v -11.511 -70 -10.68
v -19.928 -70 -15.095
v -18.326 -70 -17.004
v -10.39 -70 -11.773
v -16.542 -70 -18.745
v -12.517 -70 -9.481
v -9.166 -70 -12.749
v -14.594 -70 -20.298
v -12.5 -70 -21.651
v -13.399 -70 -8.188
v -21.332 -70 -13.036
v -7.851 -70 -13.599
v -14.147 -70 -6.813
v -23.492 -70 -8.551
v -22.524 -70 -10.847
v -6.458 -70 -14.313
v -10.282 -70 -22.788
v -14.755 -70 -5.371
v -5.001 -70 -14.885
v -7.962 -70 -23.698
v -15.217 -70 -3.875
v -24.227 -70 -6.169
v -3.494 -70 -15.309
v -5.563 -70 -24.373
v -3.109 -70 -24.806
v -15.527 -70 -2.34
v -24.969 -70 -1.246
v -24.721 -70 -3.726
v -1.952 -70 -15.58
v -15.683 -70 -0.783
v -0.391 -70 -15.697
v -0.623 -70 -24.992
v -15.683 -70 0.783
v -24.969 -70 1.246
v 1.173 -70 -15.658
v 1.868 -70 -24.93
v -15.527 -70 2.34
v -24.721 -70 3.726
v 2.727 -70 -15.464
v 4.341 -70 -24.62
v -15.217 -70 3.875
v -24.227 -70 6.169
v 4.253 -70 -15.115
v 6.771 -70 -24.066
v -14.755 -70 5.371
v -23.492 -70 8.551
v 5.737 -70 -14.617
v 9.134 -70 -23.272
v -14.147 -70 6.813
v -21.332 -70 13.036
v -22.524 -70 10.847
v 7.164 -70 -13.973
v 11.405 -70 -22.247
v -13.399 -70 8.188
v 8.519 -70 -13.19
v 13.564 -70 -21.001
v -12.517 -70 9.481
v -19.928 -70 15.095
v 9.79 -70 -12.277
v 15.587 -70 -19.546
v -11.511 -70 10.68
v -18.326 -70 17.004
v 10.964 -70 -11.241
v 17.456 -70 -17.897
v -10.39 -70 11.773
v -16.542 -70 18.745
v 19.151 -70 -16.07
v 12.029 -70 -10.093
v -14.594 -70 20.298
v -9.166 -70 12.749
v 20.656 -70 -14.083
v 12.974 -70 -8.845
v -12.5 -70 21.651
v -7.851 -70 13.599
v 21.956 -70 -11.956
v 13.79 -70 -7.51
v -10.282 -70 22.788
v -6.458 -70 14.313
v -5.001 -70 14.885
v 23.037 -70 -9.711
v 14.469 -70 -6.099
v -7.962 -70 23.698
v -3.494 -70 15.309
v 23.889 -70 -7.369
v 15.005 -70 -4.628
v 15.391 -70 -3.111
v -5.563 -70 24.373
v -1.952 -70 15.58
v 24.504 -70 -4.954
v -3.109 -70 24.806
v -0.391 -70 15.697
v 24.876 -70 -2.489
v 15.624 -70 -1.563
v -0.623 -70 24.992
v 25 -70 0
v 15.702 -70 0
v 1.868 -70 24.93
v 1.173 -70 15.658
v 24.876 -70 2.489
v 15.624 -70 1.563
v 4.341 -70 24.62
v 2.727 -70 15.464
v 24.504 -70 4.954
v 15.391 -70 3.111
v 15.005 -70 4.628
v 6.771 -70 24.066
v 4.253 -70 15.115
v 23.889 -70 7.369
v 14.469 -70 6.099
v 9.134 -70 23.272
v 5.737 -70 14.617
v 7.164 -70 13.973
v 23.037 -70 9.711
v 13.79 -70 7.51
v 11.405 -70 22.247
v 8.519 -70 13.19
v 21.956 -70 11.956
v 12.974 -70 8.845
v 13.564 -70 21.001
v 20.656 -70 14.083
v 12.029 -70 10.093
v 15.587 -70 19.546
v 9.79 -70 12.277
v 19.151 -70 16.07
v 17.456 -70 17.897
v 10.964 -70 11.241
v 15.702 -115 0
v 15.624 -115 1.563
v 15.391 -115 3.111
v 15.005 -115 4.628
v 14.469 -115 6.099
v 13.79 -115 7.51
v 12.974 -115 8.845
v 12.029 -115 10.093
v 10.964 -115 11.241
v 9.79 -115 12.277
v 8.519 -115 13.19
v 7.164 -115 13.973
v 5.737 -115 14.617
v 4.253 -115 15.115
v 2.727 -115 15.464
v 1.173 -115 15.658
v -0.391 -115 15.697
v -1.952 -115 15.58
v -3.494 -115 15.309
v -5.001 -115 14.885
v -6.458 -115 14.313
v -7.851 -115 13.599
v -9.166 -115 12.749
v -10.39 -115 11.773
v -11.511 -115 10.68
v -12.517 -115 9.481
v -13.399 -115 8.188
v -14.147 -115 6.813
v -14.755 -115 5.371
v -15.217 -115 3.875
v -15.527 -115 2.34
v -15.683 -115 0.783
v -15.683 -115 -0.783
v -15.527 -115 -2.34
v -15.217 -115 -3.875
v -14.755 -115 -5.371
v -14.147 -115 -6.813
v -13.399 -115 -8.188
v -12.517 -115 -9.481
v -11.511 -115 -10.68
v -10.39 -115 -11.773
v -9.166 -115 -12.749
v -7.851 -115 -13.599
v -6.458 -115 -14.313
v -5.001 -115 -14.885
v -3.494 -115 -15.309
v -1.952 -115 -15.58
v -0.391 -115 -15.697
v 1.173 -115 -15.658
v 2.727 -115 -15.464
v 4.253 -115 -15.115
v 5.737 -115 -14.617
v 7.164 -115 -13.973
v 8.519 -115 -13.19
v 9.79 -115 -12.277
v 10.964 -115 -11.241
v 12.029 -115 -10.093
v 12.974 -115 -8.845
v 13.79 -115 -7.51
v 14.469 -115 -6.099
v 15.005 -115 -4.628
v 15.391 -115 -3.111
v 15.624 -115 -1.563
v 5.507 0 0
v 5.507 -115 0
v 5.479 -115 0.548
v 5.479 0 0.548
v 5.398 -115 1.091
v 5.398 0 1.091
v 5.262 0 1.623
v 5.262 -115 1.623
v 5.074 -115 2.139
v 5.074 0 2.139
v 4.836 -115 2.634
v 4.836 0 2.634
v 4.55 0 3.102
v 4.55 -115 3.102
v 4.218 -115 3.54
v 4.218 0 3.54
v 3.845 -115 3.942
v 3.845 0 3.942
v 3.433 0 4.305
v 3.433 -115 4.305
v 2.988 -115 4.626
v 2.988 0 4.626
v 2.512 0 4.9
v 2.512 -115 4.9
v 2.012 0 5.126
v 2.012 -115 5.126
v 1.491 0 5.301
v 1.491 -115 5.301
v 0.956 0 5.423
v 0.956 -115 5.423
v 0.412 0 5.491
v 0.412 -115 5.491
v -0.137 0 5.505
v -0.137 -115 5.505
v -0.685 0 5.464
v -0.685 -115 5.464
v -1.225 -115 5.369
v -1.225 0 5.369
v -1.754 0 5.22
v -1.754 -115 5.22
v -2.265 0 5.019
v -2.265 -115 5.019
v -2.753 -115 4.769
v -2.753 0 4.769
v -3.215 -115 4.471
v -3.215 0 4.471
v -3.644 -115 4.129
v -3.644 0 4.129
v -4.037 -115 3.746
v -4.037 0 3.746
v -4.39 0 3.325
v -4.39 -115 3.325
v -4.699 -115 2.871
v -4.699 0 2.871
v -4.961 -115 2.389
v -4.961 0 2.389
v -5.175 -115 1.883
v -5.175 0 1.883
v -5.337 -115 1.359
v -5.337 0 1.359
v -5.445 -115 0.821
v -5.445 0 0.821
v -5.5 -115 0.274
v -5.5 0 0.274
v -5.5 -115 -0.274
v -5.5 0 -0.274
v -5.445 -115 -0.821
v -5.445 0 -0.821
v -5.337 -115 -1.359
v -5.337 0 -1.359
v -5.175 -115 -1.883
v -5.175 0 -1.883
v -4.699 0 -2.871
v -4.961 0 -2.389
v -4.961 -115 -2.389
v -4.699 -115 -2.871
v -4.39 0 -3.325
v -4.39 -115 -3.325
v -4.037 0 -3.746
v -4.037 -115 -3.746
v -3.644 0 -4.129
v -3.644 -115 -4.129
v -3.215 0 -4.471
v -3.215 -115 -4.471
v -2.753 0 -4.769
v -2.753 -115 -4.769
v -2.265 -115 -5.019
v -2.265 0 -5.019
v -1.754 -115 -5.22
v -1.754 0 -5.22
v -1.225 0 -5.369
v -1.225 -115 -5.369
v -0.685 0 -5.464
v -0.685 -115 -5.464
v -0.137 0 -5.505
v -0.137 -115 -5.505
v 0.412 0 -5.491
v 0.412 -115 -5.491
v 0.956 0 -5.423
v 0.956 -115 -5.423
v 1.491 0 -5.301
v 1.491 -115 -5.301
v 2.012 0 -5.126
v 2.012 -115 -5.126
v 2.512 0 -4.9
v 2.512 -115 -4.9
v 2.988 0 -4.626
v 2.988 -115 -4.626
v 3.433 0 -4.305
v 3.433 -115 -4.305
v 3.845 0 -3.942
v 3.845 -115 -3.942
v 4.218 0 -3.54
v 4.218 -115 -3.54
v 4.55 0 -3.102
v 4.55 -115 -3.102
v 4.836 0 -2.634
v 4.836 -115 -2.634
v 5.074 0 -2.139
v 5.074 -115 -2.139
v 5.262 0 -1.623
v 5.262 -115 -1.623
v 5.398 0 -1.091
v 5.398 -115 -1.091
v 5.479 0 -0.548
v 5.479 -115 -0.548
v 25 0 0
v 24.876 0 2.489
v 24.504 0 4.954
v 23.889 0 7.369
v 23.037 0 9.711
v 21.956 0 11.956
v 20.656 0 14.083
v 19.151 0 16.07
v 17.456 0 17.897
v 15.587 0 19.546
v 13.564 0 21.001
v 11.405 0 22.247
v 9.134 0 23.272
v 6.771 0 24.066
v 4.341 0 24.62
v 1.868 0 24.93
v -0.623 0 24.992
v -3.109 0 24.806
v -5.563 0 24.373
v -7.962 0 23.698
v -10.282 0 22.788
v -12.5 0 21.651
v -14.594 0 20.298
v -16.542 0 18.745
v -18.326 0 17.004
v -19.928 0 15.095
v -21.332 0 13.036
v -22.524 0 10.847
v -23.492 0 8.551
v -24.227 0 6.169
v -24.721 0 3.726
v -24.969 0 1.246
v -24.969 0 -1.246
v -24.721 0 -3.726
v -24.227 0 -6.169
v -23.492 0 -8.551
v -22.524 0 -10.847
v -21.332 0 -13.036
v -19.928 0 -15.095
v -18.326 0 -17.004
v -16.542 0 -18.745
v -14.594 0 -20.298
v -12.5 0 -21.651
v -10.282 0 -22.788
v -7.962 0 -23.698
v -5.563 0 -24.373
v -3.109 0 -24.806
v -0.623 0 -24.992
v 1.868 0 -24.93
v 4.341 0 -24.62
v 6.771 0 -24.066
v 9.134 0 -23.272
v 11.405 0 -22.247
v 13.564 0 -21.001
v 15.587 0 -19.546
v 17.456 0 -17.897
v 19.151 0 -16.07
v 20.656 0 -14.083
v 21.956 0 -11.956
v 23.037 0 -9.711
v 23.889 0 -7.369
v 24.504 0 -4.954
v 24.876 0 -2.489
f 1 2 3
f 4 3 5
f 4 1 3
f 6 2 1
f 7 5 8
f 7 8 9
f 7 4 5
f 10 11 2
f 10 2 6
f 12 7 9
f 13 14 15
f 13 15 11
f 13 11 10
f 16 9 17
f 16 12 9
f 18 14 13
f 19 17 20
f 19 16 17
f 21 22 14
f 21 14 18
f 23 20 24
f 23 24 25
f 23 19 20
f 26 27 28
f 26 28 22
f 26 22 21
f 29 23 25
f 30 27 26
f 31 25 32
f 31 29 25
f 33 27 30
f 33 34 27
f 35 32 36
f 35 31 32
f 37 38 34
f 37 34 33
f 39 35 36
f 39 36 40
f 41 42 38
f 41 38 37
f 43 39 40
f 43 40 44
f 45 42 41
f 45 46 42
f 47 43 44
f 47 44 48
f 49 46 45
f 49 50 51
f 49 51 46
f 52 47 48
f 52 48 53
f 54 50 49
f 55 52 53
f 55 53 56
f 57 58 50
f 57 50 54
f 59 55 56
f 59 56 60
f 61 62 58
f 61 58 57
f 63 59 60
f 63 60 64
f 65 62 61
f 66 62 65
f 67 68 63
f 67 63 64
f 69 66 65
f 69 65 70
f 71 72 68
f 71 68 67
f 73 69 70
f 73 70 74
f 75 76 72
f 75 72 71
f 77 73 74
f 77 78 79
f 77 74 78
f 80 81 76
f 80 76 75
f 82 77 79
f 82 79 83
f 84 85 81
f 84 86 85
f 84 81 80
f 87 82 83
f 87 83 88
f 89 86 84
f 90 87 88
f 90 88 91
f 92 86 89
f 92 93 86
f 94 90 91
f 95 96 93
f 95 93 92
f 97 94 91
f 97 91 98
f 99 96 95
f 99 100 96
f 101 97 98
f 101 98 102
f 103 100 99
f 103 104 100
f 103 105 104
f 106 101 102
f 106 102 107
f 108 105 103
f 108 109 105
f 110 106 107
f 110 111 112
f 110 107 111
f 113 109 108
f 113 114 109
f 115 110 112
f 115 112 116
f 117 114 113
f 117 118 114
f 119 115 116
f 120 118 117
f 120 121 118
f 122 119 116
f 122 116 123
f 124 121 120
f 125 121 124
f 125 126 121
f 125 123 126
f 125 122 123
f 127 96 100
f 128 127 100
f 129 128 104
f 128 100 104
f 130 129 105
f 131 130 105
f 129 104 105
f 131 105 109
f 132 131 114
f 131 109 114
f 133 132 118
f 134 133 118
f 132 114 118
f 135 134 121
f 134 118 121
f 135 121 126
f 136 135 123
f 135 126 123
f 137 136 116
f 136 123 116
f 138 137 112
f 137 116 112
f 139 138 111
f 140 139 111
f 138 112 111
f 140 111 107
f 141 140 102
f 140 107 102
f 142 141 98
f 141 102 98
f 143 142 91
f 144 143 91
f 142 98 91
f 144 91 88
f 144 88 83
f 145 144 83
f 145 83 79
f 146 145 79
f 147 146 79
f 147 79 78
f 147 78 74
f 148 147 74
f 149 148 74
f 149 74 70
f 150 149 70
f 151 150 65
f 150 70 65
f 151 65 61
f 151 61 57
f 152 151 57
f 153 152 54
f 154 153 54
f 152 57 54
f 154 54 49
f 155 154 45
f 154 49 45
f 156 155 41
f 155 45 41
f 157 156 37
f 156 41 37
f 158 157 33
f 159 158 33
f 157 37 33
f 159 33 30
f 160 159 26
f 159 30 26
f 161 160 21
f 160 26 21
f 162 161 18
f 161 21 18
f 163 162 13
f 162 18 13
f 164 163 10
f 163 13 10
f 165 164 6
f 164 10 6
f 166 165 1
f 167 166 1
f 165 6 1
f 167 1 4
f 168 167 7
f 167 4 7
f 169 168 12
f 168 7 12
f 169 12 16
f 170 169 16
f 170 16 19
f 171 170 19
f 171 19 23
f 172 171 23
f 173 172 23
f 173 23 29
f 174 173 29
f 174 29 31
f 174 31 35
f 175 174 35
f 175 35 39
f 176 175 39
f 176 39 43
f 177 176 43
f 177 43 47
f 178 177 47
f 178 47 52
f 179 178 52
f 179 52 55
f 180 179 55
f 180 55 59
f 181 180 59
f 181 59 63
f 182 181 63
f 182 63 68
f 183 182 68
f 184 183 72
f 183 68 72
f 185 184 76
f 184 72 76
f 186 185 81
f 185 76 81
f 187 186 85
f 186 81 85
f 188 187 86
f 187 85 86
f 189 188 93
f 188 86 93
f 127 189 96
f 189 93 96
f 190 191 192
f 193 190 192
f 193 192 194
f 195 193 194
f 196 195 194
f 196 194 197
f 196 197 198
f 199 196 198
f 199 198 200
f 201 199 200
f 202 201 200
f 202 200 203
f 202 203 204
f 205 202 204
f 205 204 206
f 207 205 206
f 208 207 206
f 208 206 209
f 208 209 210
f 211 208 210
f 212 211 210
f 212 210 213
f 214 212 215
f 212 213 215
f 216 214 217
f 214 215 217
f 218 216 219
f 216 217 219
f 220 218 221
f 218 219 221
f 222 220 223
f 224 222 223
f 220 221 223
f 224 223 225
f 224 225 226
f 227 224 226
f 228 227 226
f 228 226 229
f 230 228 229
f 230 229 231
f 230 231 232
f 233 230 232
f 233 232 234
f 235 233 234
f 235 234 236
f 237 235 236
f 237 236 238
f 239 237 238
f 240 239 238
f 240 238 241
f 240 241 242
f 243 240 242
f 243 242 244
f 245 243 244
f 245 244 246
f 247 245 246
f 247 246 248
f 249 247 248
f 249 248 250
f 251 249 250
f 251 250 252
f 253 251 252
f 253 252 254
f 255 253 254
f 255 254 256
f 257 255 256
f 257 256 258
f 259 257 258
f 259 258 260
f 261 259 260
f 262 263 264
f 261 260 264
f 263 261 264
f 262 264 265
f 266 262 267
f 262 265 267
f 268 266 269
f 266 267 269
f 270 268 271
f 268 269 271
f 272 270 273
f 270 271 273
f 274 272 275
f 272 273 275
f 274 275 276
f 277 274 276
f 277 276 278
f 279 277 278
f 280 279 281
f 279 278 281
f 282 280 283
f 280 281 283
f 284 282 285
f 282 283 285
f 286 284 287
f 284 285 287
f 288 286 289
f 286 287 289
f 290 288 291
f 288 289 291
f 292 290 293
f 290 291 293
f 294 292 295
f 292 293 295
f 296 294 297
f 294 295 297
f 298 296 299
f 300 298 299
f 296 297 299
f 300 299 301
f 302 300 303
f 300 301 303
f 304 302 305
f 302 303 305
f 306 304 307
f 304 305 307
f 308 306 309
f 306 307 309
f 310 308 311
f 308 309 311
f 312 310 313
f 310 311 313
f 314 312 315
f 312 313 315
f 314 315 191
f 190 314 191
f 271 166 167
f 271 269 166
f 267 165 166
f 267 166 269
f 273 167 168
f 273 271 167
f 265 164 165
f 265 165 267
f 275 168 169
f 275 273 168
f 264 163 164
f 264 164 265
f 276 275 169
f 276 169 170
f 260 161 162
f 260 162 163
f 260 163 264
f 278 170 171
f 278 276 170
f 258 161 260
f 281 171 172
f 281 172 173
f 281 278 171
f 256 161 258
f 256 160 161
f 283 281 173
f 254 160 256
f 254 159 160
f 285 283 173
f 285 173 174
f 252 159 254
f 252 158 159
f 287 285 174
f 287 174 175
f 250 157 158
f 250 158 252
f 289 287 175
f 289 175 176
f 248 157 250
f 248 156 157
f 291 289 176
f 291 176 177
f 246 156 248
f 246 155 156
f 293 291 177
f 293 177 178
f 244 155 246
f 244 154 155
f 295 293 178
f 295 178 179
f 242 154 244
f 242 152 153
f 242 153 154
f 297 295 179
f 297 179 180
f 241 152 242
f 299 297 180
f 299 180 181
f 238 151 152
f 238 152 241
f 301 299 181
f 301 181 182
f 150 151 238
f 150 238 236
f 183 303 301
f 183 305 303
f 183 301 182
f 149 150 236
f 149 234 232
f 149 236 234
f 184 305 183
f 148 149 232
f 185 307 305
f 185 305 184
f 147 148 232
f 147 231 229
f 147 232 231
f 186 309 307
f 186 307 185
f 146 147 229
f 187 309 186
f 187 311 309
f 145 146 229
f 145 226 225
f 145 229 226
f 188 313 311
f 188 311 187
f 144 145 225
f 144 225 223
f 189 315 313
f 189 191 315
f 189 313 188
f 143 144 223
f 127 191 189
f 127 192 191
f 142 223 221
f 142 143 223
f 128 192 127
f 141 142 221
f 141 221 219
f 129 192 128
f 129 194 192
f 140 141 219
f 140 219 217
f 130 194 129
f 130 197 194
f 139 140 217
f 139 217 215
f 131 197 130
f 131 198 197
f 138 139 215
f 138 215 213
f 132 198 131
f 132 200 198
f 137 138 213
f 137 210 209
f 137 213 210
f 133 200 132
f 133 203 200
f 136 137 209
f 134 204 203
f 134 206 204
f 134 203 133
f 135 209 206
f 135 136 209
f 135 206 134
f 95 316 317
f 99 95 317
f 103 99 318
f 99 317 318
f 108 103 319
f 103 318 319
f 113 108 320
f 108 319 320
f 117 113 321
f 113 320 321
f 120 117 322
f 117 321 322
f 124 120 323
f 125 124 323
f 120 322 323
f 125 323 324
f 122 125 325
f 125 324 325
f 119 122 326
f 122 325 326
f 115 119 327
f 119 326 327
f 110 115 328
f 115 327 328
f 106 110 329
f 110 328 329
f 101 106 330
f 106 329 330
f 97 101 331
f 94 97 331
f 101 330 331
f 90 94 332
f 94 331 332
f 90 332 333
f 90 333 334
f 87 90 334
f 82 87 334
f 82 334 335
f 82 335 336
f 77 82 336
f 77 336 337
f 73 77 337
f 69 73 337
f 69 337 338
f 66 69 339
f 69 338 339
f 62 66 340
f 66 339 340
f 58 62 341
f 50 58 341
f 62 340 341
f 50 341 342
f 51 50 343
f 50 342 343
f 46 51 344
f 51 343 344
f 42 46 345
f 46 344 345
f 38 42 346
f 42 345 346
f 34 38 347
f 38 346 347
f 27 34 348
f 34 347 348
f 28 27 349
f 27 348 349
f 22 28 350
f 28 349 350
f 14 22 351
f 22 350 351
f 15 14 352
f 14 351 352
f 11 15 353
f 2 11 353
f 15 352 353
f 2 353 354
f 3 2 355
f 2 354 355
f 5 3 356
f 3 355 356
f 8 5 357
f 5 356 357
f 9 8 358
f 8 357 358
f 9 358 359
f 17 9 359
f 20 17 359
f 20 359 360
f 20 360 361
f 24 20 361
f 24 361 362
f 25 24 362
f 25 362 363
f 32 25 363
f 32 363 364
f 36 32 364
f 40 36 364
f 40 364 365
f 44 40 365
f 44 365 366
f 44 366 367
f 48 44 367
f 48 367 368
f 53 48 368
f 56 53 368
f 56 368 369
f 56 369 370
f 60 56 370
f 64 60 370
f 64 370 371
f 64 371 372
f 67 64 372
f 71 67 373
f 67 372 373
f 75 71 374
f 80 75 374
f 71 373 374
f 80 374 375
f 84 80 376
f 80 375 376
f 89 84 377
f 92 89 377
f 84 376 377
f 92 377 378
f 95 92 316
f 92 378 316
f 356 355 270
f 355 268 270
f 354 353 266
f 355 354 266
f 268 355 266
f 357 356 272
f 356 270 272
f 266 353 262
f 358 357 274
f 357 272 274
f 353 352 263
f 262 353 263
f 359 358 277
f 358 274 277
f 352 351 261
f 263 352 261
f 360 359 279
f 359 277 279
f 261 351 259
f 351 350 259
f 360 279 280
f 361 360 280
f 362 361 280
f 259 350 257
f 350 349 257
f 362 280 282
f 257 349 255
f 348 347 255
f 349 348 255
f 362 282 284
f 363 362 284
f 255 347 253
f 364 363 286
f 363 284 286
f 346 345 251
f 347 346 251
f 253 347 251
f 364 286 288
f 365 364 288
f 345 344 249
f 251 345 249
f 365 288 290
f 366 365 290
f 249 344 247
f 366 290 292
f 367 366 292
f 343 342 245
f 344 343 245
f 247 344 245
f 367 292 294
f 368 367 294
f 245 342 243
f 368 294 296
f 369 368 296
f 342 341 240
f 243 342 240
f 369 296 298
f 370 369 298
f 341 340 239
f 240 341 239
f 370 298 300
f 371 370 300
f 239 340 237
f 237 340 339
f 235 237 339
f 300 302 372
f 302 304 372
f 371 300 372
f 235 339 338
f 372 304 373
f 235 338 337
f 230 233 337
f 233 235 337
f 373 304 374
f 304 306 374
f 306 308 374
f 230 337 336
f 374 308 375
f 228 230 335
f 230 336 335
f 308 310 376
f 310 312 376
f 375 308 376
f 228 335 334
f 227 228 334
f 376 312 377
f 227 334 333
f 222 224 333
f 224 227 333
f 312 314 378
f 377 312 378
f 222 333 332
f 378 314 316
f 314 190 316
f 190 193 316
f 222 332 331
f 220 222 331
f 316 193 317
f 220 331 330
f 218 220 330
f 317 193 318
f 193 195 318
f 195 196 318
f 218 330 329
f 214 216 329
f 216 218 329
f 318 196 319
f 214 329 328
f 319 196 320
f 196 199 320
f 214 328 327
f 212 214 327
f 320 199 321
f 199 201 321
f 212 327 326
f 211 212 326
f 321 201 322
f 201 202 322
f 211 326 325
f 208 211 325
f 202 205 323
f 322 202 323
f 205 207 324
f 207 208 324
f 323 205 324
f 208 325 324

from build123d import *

# Parameters (mm, degrees)
F0_R     = 25
F1_DEPTH = 70
F2_R     = 15.702302
F3_DEPTH = 45
F4_R     = 5.506821
F5_DEPTH = 115.001


with BuildPart() as f1:
    # F0 (on Front) → F1 (new body)
    with BuildSketch(Plane.XZ):
        Circle(F0_R)
    extrude(amount=F1_DEPTH)

    # F2 (on face) → F3 (join)
    with BuildSketch(Plane.XZ.offset(70)):
        Circle(F2_R)
    extrude(amount=F3_DEPTH)

    # F4 (on face) → F5 (cut, through all)
    with BuildSketch(Plane.XZ.offset(115)):
        Circle(F4_R)
        Polygon((-39.301679, 0), (-54.846372, 51.766761), (-54.846372, 0), align=None)
    extrude(amount=-F5_DEPTH, mode=Mode.SUBTRACT)


solid = f1.part
